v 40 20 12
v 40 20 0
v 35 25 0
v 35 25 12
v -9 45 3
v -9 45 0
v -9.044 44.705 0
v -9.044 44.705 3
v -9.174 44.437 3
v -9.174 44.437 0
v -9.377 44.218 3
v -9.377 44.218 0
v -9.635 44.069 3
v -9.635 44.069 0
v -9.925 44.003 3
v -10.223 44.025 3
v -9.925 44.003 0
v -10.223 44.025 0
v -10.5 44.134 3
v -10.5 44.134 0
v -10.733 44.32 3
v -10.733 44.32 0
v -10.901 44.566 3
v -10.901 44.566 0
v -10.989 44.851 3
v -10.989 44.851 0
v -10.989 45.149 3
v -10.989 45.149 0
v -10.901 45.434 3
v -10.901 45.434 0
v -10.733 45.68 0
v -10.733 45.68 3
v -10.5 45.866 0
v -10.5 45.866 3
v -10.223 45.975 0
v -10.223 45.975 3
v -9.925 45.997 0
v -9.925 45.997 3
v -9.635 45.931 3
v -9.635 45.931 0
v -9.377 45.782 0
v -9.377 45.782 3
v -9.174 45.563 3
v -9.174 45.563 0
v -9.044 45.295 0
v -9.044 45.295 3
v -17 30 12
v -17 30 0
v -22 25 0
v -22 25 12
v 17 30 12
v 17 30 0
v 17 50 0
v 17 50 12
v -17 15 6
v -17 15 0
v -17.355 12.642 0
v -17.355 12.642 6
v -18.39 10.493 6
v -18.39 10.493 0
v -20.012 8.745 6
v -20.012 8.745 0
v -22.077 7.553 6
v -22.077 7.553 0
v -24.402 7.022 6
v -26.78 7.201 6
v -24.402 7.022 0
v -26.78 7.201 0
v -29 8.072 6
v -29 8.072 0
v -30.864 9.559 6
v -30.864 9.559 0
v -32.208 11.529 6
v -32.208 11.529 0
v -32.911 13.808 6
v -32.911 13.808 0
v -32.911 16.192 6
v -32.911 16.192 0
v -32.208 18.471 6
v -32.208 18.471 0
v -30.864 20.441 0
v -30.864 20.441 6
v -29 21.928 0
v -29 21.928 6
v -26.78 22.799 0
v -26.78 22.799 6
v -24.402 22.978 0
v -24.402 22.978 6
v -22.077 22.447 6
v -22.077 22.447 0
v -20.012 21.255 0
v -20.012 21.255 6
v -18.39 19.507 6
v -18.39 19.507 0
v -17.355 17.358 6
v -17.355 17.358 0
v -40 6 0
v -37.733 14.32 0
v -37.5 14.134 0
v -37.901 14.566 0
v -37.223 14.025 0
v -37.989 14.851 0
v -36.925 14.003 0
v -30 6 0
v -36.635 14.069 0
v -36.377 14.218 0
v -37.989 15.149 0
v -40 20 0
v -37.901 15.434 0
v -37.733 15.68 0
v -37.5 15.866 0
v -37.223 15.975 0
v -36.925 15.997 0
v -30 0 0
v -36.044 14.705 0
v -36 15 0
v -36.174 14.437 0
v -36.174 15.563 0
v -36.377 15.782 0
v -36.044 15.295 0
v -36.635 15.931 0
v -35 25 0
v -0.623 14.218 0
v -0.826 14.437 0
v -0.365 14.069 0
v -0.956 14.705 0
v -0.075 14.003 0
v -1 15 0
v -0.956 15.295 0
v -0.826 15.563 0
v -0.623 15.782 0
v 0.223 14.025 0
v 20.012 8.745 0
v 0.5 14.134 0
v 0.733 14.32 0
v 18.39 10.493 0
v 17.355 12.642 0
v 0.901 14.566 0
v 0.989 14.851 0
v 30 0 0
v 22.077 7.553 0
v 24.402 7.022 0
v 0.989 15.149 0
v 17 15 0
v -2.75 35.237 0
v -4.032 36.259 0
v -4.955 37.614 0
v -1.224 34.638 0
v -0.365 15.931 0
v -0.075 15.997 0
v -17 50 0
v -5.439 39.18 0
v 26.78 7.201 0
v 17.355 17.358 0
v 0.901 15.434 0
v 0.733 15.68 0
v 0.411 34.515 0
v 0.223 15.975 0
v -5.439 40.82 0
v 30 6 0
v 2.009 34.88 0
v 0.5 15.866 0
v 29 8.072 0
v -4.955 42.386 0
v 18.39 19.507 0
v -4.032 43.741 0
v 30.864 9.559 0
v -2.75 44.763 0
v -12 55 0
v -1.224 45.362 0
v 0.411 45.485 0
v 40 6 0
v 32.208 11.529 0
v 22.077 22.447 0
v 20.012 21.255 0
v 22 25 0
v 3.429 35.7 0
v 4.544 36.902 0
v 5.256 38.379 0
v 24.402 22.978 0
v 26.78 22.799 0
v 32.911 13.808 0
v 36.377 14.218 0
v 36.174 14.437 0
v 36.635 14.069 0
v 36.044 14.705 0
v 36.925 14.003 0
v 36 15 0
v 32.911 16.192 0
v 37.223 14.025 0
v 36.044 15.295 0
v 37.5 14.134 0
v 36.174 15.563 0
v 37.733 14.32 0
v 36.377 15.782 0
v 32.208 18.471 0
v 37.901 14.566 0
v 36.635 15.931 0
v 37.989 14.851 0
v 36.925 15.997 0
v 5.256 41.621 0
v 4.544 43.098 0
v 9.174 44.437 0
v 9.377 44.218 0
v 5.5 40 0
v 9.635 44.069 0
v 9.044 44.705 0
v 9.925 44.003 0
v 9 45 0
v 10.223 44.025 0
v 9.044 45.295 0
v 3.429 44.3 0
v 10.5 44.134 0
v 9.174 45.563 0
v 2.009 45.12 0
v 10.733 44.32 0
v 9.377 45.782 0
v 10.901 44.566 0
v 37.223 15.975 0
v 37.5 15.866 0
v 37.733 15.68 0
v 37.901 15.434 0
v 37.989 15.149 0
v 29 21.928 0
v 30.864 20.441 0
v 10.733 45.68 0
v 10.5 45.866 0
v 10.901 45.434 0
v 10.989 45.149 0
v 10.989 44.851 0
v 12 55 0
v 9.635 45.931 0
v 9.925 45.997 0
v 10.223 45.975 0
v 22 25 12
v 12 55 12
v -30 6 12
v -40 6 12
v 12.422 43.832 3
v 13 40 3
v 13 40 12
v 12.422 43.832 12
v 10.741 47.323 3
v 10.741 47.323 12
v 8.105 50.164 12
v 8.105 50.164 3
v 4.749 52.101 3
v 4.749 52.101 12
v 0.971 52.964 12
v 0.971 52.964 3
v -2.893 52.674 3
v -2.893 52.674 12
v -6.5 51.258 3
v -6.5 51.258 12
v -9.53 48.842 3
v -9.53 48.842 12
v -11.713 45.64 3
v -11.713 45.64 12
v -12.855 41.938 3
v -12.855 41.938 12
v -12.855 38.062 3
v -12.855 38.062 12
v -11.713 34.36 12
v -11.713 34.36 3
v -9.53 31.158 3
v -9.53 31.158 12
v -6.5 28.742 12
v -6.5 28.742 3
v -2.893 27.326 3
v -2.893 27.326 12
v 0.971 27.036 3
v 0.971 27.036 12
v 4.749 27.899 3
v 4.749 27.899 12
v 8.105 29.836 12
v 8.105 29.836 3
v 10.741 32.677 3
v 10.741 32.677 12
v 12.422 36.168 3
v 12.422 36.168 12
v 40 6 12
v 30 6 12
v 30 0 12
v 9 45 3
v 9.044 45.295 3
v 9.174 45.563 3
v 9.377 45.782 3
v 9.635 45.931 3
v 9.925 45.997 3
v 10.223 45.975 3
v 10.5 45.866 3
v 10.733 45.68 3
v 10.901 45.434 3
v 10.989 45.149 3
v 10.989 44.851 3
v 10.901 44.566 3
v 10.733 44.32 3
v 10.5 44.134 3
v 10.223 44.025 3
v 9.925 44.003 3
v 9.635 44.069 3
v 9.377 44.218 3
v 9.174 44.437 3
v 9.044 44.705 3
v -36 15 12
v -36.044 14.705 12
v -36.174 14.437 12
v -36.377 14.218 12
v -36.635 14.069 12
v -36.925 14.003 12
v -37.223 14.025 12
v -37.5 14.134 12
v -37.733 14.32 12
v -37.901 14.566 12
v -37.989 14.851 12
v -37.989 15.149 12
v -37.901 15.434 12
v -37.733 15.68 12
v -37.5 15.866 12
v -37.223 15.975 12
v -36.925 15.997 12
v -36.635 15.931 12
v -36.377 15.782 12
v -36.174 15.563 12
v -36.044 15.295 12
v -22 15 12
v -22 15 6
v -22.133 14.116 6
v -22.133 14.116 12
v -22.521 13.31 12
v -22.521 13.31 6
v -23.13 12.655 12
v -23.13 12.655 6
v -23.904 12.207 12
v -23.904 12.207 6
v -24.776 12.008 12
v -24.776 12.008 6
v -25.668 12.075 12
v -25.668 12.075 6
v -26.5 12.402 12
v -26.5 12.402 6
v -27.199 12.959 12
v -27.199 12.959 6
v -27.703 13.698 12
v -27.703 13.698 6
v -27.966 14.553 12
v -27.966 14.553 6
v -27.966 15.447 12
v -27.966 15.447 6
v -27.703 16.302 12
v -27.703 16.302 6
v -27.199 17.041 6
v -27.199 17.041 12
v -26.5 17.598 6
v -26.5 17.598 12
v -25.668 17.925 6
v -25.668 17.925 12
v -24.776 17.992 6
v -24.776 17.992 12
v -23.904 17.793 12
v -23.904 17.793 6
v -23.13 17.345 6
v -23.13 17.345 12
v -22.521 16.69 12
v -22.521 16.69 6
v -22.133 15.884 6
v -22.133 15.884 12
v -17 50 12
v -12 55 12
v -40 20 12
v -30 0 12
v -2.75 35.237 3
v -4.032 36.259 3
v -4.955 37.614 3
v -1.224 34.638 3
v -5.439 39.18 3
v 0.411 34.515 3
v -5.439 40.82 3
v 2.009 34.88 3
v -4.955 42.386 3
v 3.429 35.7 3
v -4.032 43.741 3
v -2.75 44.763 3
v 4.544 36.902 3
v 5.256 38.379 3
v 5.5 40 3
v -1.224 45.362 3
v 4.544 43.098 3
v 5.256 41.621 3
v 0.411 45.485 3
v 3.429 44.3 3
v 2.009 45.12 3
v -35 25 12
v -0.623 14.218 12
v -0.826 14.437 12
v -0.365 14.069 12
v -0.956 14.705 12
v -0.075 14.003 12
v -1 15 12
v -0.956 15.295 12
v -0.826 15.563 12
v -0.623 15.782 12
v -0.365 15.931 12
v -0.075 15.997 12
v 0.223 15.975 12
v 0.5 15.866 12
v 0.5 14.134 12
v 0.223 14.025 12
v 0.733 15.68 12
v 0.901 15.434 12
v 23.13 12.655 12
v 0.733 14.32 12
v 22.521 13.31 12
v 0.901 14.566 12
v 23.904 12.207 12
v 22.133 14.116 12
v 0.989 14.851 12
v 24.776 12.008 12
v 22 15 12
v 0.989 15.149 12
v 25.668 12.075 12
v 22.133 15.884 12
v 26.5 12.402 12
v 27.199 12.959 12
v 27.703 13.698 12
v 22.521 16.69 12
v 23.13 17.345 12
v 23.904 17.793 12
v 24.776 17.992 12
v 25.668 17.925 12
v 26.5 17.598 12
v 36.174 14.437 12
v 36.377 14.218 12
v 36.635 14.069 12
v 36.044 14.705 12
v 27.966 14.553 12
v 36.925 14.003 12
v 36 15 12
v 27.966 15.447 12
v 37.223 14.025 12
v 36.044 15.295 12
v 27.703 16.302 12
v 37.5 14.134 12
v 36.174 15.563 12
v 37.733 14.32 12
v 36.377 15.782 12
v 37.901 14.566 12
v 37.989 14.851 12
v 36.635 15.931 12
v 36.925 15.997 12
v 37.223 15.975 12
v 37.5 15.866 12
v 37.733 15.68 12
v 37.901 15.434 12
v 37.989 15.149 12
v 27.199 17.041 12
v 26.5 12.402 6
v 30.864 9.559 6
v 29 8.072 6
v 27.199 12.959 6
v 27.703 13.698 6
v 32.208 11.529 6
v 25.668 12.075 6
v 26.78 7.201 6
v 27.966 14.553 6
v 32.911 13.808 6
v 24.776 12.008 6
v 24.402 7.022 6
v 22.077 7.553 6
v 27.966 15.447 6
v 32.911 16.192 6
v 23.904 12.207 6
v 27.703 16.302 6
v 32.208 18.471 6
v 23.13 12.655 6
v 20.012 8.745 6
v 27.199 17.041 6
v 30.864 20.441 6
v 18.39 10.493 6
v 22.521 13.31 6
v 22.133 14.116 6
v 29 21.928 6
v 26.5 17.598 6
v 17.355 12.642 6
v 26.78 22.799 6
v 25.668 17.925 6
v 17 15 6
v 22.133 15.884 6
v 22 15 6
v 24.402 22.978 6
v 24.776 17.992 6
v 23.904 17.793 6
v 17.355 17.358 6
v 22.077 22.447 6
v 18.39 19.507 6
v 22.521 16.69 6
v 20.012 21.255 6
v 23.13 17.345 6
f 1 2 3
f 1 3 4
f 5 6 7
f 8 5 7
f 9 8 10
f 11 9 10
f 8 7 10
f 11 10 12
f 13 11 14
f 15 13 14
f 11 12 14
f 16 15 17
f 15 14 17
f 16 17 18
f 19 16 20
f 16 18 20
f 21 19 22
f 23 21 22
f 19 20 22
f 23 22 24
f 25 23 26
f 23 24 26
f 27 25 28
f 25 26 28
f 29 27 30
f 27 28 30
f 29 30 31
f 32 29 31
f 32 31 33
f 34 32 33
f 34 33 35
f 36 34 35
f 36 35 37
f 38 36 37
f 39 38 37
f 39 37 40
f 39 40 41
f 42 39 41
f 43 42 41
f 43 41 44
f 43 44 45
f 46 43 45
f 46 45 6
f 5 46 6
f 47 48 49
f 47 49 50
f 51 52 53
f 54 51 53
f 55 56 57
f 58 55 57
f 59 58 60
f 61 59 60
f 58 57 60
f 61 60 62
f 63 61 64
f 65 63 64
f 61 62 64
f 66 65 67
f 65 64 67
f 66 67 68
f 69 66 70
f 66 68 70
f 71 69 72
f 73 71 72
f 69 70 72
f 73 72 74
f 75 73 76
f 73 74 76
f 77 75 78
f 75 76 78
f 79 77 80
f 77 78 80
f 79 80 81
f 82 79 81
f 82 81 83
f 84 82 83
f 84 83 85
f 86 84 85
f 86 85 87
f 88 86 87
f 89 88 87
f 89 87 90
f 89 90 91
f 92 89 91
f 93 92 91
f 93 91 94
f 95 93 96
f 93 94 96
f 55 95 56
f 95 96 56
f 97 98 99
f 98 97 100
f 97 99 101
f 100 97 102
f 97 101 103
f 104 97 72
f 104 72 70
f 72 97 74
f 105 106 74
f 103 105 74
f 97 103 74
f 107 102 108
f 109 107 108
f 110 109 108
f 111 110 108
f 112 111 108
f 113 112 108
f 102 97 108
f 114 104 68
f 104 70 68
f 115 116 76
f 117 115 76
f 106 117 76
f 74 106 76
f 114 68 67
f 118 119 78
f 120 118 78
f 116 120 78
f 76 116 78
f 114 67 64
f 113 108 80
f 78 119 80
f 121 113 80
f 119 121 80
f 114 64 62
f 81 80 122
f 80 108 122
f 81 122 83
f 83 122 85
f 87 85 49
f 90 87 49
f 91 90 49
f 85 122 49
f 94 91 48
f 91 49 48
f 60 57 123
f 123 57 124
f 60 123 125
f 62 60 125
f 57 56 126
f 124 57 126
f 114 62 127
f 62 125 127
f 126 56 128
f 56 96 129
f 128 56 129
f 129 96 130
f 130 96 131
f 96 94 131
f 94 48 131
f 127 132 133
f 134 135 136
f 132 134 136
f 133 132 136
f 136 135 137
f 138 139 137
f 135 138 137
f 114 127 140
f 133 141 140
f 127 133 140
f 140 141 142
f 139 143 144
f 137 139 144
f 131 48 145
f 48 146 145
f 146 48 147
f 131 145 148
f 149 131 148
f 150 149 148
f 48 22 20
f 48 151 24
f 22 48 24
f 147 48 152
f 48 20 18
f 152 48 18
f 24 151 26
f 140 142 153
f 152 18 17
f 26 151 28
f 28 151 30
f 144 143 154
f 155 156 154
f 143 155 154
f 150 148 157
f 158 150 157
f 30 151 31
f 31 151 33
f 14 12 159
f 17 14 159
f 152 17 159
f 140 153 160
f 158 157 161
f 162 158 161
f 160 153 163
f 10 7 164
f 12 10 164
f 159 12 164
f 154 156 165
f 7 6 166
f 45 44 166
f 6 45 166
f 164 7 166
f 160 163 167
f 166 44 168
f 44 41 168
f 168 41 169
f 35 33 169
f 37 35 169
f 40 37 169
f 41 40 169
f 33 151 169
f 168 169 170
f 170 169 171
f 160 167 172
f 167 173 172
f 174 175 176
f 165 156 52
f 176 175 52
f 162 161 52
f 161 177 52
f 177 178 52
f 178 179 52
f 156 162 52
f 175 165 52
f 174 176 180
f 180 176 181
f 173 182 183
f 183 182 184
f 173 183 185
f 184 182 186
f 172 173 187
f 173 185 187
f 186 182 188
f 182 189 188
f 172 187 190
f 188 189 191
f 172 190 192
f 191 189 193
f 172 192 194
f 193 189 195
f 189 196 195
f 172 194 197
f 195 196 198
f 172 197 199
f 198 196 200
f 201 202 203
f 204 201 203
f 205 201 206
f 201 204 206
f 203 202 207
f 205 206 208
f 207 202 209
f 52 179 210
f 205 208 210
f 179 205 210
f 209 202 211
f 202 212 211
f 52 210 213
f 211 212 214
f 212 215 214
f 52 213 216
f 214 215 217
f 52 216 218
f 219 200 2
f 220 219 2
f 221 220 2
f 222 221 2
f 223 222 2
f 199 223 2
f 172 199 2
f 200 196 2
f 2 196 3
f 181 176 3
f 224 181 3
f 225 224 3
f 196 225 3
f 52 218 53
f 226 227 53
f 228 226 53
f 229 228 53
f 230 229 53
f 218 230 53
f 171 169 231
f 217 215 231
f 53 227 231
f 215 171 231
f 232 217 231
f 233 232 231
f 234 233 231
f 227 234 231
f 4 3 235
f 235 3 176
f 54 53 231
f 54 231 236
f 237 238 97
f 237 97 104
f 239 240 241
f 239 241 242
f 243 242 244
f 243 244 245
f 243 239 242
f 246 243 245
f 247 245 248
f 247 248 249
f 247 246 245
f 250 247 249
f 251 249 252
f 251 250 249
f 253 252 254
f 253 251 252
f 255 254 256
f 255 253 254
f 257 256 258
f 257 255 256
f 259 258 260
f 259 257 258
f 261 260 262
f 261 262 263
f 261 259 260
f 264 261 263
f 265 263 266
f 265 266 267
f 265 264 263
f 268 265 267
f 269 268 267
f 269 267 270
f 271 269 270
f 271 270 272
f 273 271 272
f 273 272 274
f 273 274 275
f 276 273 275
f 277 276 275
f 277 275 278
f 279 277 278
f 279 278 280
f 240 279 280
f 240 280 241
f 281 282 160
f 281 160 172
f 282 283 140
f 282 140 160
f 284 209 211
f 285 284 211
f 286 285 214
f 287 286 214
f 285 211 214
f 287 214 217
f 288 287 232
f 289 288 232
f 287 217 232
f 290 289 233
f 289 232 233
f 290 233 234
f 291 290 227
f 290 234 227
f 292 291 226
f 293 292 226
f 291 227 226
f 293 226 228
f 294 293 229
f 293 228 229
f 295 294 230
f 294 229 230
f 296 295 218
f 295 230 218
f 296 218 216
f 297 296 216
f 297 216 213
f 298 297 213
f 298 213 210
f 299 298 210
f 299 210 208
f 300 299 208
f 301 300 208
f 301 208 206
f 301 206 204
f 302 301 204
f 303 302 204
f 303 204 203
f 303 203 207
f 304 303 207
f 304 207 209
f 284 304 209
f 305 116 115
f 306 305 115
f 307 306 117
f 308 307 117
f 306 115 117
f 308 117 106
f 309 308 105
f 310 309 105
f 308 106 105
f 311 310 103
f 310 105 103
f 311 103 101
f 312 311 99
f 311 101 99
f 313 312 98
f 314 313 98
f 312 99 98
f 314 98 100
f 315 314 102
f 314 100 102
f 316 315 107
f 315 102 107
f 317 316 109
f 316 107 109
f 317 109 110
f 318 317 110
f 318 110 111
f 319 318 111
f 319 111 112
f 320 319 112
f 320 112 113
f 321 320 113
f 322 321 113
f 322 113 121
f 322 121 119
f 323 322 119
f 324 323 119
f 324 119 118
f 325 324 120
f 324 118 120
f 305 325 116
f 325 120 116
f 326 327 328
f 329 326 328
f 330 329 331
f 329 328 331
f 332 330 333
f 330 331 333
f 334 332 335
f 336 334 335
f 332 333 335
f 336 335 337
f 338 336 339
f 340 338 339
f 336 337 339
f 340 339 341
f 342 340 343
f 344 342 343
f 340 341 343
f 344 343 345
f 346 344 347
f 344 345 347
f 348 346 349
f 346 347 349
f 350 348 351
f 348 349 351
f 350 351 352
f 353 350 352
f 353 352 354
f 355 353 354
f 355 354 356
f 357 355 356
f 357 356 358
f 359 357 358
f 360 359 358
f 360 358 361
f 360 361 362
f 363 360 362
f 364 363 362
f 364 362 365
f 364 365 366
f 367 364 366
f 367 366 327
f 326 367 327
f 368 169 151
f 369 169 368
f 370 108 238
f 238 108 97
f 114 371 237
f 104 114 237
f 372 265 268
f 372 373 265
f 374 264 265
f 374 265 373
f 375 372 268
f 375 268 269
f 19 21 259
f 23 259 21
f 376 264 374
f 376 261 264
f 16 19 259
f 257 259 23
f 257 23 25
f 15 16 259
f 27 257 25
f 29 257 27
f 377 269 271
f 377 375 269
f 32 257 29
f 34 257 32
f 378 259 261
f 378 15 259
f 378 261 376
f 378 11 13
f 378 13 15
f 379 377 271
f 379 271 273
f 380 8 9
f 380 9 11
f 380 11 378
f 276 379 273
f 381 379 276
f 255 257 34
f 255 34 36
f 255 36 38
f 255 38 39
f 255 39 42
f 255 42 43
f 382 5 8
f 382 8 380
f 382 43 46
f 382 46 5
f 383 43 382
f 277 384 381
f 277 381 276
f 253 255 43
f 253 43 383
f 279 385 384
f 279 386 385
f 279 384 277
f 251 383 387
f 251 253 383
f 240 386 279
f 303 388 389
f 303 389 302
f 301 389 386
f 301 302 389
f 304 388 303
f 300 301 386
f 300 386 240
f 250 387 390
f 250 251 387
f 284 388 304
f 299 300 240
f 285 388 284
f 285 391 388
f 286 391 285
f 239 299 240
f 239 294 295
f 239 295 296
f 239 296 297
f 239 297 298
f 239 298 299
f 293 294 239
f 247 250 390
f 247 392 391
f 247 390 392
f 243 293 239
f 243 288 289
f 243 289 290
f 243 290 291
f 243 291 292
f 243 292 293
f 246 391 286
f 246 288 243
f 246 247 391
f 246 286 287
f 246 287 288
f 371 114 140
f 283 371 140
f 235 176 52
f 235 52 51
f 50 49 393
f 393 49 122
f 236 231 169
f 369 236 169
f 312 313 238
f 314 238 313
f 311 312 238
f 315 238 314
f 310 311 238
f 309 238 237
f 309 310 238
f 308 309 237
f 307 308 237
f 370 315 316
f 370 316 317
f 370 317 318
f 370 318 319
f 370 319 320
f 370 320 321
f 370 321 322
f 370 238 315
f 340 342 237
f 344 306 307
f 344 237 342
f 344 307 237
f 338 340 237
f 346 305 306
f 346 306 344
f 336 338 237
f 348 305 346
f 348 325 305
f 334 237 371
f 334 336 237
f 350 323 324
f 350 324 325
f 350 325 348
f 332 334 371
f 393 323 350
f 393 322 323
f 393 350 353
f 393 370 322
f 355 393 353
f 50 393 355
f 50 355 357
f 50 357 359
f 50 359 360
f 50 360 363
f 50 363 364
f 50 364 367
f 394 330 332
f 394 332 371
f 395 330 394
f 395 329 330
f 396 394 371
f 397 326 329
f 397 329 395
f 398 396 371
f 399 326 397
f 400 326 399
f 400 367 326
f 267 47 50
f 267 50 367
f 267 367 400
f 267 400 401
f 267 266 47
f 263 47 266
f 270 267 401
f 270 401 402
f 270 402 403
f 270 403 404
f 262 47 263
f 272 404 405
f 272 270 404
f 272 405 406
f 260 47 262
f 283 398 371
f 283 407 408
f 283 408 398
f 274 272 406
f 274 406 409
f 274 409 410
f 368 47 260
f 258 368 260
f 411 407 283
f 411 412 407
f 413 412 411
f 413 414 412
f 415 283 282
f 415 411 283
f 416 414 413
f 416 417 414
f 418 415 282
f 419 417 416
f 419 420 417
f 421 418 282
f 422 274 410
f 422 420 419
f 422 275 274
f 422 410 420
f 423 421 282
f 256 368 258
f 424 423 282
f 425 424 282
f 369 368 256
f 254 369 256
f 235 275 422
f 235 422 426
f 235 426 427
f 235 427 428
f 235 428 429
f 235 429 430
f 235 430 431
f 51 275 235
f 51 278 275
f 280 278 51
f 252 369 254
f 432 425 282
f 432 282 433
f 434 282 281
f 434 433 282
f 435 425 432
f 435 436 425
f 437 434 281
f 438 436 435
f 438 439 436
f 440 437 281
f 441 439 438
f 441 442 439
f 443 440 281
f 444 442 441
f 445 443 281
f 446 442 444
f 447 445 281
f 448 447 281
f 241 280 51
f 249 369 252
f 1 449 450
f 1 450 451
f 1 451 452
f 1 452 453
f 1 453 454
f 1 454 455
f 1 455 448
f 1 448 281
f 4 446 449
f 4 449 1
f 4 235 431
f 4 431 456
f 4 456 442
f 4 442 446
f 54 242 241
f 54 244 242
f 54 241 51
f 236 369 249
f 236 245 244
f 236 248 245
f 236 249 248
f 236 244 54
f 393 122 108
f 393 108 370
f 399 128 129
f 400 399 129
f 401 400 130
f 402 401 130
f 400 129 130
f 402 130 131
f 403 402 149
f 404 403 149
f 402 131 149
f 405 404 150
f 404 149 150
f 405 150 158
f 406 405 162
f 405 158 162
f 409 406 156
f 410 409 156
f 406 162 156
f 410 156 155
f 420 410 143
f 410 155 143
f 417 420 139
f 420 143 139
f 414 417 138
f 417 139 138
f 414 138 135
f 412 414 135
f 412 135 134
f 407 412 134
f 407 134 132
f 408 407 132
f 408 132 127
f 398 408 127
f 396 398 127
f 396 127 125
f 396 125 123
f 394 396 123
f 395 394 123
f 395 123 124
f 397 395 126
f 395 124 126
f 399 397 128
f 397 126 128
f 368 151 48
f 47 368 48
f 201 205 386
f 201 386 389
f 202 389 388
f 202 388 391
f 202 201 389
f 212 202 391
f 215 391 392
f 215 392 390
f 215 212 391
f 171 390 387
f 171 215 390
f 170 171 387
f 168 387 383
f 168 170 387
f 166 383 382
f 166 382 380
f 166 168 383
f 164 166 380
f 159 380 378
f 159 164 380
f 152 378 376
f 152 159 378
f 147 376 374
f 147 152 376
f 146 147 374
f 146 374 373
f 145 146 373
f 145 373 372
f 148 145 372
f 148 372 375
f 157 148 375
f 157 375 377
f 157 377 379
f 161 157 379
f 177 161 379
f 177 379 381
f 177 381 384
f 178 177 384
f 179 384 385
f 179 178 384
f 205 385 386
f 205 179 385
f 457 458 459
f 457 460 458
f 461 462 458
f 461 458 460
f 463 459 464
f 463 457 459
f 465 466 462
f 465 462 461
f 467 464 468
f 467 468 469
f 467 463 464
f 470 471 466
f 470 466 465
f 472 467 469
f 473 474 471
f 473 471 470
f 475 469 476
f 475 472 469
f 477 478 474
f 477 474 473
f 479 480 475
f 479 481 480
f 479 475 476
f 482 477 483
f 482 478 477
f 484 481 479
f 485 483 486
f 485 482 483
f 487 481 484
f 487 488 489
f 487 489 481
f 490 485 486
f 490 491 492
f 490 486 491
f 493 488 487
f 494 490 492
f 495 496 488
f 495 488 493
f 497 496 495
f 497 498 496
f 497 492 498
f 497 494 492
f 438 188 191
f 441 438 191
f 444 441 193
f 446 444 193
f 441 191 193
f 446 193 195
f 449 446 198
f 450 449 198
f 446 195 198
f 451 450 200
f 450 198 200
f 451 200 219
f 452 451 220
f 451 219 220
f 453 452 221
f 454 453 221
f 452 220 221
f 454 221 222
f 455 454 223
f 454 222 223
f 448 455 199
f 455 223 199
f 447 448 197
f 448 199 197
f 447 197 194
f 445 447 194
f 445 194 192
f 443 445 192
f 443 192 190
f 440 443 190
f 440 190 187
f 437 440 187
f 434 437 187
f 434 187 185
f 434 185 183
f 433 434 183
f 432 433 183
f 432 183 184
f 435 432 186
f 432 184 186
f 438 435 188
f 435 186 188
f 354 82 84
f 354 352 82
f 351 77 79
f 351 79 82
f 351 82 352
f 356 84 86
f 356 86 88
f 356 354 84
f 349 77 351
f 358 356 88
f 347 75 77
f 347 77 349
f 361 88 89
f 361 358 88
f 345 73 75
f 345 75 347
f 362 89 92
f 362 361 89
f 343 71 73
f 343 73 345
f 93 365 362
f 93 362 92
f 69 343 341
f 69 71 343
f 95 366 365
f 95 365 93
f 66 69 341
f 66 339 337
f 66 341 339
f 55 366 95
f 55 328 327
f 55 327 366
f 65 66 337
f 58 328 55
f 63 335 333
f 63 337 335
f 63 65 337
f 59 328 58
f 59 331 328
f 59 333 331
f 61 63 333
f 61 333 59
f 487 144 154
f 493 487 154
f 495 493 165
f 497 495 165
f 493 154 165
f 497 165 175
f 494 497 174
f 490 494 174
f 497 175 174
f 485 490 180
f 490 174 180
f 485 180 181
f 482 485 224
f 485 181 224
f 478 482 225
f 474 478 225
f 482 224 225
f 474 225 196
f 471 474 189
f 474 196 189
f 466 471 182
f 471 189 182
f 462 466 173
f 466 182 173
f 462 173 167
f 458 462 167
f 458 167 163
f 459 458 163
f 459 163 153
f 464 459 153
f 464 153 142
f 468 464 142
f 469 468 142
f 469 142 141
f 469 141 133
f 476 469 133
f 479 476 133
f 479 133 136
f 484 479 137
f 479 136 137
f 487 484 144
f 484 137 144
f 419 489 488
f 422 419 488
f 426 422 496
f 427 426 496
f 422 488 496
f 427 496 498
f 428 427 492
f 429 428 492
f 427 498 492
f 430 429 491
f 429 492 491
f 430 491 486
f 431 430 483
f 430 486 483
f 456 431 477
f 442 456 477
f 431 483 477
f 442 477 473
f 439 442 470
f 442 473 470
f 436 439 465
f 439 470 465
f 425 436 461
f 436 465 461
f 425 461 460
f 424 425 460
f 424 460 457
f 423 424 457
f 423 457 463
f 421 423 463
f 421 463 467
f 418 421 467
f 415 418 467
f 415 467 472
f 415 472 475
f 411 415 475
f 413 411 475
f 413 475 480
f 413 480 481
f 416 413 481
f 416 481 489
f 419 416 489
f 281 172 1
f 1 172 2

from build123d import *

# Parameters (mm, degrees)
ESQUISSE1_R             = 13
BOSS_EXTRU_1_DEPTH      = 12
BOSS_EXTRU_2_START      = -12
ESQUISSE2_R             = 13
ESQUISSE2_R_2           = 5.5
BOSS_EXTRU_2_DEPTH      = 3
ESQUISSE4_R             = 8
ENL_V_MAT_EXTRU_2_DEPTH = 6
ESQUISSE5_R             = 3
ENL_V_MAT_EXTRU_3_DEPTH = 69.271516755
ESQUISSE6_W             = 10
ESQUISSE6_H             = 6
ENL_V_MAT_EXTRU_4_DEPTH = 12
CHANFREIN1_SIZE         = 5
ESQUISSE7_R             = 1
ENL_V_MAT_EXTRU_5_DEPTH = 12


with BuildPart() as part:
    # Esquisse1 → Boss.-Extru.1 (new body)
    with BuildSketch(Plane.XY):
        Polygon((-40, 0), (40, 0), (40, 25), (17, 25), (17, 55), (-17, 55), (-17, 25), (-40, 25), align=None)
        with Locations((0, 40)):
            Circle(ESQUISSE1_R, mode=Mode.SUBTRACT)
    extrude(amount=BOSS_EXTRU_1_DEPTH)

    # Esquisse2 → Boss.-Extru.2 (add)
    with BuildSketch(Plane.XY.offset(12).offset(BOSS_EXTRU_2_START)):
        with Locations((0, 40)):
            Circle(ESQUISSE2_R)
        with Locations((0, 40)):
            Circle(ESQUISSE2_R_2, mode=Mode.SUBTRACT)
    extrude(amount=BOSS_EXTRU_2_DEPTH)

    # Esquisse4 → Enlèv. mat.-Extru.2 (cut)
    with BuildSketch(Plane(origin=(0, 0, 0), x_dir=(-1, 0, 0), z_dir=(0, 0, -1))):
        with Locations((-25, 15)):
            Circle(ESQUISSE4_R)
        with Locations(Location((25, 15, 0), (0, 0, 180))):
            Circle(ESQUISSE4_R)
    extrude(amount=-ENL_V_MAT_EXTRU_2_DEPTH, mode=Mode.SUBTRACT)

    # Esquisse5 → Enlèv. mat.-Extru.3 (cut, through all)
    with BuildSketch(Plane(origin=(0, 0, 6), x_dir=(-1, 0, 0), z_dir=(0, 0, -1))):
        with Locations((-25, 15)):
            Circle(ESQUISSE5_R)
        with Locations(Location((25, 15, 0), (0, 0, 180))):
            Circle(ESQUISSE5_R)
    extrude(amount=-ENL_V_MAT_EXTRU_3_DEPTH, mode=Mode.SUBTRACT)

    # Esquisse6 → Enlèv. mat.-Extru.4 (cut)
    with BuildSketch(Plane.XY.offset(12)):
        with Locations((35, 3)):
            Rectangle(ESQUISSE6_W, ESQUISSE6_H)
        with Locations((-35, 3)):
            Rectangle(ESQUISSE6_W, ESQUISSE6_H)
    extrude(amount=-ENL_V_MAT_EXTRU_4_DEPTH, mode=Mode.SUBTRACT)

    # Chanfrein1
    chanfrein1_edges = [part.edges().sort_by_distance(p)[0] for p in [
        (-17, 55, 6),
        (17, 55, 6),
        (17, 25, 6),
        (40, 25, 6),
        (-40, 25, 6),
        (-17, 25, 6),
    ]]
    chamfer(chanfrein1_edges, length=CHANFREIN1_SIZE)

    # Esquisse7 → Enlèv. mat.-Extru.5 (cut)
    with BuildSketch(Plane(origin=(0, 0, 0), x_dir=(-1, 0, 0), z_dir=(0, 0, -1))):
        with Locations((-10, 45)):
            Circle(ESQUISSE7_R)
        with Locations(Location((10, 45, 0), (0, 0, 180))):
            Circle(ESQUISSE7_R)
        with Locations((-37, 15)):
            Circle(ESQUISSE7_R)
        with Locations(Location((37, 15, 0), (0, 0, 180))):
            Circle(ESQUISSE7_R)
        with Locations((0, 15)):
            Circle(ESQUISSE7_R)
    extrude(amount=-ENL_V_MAT_EXTRU_5_DEPTH, mode=Mode.SUBTRACT)


solid = part.part
